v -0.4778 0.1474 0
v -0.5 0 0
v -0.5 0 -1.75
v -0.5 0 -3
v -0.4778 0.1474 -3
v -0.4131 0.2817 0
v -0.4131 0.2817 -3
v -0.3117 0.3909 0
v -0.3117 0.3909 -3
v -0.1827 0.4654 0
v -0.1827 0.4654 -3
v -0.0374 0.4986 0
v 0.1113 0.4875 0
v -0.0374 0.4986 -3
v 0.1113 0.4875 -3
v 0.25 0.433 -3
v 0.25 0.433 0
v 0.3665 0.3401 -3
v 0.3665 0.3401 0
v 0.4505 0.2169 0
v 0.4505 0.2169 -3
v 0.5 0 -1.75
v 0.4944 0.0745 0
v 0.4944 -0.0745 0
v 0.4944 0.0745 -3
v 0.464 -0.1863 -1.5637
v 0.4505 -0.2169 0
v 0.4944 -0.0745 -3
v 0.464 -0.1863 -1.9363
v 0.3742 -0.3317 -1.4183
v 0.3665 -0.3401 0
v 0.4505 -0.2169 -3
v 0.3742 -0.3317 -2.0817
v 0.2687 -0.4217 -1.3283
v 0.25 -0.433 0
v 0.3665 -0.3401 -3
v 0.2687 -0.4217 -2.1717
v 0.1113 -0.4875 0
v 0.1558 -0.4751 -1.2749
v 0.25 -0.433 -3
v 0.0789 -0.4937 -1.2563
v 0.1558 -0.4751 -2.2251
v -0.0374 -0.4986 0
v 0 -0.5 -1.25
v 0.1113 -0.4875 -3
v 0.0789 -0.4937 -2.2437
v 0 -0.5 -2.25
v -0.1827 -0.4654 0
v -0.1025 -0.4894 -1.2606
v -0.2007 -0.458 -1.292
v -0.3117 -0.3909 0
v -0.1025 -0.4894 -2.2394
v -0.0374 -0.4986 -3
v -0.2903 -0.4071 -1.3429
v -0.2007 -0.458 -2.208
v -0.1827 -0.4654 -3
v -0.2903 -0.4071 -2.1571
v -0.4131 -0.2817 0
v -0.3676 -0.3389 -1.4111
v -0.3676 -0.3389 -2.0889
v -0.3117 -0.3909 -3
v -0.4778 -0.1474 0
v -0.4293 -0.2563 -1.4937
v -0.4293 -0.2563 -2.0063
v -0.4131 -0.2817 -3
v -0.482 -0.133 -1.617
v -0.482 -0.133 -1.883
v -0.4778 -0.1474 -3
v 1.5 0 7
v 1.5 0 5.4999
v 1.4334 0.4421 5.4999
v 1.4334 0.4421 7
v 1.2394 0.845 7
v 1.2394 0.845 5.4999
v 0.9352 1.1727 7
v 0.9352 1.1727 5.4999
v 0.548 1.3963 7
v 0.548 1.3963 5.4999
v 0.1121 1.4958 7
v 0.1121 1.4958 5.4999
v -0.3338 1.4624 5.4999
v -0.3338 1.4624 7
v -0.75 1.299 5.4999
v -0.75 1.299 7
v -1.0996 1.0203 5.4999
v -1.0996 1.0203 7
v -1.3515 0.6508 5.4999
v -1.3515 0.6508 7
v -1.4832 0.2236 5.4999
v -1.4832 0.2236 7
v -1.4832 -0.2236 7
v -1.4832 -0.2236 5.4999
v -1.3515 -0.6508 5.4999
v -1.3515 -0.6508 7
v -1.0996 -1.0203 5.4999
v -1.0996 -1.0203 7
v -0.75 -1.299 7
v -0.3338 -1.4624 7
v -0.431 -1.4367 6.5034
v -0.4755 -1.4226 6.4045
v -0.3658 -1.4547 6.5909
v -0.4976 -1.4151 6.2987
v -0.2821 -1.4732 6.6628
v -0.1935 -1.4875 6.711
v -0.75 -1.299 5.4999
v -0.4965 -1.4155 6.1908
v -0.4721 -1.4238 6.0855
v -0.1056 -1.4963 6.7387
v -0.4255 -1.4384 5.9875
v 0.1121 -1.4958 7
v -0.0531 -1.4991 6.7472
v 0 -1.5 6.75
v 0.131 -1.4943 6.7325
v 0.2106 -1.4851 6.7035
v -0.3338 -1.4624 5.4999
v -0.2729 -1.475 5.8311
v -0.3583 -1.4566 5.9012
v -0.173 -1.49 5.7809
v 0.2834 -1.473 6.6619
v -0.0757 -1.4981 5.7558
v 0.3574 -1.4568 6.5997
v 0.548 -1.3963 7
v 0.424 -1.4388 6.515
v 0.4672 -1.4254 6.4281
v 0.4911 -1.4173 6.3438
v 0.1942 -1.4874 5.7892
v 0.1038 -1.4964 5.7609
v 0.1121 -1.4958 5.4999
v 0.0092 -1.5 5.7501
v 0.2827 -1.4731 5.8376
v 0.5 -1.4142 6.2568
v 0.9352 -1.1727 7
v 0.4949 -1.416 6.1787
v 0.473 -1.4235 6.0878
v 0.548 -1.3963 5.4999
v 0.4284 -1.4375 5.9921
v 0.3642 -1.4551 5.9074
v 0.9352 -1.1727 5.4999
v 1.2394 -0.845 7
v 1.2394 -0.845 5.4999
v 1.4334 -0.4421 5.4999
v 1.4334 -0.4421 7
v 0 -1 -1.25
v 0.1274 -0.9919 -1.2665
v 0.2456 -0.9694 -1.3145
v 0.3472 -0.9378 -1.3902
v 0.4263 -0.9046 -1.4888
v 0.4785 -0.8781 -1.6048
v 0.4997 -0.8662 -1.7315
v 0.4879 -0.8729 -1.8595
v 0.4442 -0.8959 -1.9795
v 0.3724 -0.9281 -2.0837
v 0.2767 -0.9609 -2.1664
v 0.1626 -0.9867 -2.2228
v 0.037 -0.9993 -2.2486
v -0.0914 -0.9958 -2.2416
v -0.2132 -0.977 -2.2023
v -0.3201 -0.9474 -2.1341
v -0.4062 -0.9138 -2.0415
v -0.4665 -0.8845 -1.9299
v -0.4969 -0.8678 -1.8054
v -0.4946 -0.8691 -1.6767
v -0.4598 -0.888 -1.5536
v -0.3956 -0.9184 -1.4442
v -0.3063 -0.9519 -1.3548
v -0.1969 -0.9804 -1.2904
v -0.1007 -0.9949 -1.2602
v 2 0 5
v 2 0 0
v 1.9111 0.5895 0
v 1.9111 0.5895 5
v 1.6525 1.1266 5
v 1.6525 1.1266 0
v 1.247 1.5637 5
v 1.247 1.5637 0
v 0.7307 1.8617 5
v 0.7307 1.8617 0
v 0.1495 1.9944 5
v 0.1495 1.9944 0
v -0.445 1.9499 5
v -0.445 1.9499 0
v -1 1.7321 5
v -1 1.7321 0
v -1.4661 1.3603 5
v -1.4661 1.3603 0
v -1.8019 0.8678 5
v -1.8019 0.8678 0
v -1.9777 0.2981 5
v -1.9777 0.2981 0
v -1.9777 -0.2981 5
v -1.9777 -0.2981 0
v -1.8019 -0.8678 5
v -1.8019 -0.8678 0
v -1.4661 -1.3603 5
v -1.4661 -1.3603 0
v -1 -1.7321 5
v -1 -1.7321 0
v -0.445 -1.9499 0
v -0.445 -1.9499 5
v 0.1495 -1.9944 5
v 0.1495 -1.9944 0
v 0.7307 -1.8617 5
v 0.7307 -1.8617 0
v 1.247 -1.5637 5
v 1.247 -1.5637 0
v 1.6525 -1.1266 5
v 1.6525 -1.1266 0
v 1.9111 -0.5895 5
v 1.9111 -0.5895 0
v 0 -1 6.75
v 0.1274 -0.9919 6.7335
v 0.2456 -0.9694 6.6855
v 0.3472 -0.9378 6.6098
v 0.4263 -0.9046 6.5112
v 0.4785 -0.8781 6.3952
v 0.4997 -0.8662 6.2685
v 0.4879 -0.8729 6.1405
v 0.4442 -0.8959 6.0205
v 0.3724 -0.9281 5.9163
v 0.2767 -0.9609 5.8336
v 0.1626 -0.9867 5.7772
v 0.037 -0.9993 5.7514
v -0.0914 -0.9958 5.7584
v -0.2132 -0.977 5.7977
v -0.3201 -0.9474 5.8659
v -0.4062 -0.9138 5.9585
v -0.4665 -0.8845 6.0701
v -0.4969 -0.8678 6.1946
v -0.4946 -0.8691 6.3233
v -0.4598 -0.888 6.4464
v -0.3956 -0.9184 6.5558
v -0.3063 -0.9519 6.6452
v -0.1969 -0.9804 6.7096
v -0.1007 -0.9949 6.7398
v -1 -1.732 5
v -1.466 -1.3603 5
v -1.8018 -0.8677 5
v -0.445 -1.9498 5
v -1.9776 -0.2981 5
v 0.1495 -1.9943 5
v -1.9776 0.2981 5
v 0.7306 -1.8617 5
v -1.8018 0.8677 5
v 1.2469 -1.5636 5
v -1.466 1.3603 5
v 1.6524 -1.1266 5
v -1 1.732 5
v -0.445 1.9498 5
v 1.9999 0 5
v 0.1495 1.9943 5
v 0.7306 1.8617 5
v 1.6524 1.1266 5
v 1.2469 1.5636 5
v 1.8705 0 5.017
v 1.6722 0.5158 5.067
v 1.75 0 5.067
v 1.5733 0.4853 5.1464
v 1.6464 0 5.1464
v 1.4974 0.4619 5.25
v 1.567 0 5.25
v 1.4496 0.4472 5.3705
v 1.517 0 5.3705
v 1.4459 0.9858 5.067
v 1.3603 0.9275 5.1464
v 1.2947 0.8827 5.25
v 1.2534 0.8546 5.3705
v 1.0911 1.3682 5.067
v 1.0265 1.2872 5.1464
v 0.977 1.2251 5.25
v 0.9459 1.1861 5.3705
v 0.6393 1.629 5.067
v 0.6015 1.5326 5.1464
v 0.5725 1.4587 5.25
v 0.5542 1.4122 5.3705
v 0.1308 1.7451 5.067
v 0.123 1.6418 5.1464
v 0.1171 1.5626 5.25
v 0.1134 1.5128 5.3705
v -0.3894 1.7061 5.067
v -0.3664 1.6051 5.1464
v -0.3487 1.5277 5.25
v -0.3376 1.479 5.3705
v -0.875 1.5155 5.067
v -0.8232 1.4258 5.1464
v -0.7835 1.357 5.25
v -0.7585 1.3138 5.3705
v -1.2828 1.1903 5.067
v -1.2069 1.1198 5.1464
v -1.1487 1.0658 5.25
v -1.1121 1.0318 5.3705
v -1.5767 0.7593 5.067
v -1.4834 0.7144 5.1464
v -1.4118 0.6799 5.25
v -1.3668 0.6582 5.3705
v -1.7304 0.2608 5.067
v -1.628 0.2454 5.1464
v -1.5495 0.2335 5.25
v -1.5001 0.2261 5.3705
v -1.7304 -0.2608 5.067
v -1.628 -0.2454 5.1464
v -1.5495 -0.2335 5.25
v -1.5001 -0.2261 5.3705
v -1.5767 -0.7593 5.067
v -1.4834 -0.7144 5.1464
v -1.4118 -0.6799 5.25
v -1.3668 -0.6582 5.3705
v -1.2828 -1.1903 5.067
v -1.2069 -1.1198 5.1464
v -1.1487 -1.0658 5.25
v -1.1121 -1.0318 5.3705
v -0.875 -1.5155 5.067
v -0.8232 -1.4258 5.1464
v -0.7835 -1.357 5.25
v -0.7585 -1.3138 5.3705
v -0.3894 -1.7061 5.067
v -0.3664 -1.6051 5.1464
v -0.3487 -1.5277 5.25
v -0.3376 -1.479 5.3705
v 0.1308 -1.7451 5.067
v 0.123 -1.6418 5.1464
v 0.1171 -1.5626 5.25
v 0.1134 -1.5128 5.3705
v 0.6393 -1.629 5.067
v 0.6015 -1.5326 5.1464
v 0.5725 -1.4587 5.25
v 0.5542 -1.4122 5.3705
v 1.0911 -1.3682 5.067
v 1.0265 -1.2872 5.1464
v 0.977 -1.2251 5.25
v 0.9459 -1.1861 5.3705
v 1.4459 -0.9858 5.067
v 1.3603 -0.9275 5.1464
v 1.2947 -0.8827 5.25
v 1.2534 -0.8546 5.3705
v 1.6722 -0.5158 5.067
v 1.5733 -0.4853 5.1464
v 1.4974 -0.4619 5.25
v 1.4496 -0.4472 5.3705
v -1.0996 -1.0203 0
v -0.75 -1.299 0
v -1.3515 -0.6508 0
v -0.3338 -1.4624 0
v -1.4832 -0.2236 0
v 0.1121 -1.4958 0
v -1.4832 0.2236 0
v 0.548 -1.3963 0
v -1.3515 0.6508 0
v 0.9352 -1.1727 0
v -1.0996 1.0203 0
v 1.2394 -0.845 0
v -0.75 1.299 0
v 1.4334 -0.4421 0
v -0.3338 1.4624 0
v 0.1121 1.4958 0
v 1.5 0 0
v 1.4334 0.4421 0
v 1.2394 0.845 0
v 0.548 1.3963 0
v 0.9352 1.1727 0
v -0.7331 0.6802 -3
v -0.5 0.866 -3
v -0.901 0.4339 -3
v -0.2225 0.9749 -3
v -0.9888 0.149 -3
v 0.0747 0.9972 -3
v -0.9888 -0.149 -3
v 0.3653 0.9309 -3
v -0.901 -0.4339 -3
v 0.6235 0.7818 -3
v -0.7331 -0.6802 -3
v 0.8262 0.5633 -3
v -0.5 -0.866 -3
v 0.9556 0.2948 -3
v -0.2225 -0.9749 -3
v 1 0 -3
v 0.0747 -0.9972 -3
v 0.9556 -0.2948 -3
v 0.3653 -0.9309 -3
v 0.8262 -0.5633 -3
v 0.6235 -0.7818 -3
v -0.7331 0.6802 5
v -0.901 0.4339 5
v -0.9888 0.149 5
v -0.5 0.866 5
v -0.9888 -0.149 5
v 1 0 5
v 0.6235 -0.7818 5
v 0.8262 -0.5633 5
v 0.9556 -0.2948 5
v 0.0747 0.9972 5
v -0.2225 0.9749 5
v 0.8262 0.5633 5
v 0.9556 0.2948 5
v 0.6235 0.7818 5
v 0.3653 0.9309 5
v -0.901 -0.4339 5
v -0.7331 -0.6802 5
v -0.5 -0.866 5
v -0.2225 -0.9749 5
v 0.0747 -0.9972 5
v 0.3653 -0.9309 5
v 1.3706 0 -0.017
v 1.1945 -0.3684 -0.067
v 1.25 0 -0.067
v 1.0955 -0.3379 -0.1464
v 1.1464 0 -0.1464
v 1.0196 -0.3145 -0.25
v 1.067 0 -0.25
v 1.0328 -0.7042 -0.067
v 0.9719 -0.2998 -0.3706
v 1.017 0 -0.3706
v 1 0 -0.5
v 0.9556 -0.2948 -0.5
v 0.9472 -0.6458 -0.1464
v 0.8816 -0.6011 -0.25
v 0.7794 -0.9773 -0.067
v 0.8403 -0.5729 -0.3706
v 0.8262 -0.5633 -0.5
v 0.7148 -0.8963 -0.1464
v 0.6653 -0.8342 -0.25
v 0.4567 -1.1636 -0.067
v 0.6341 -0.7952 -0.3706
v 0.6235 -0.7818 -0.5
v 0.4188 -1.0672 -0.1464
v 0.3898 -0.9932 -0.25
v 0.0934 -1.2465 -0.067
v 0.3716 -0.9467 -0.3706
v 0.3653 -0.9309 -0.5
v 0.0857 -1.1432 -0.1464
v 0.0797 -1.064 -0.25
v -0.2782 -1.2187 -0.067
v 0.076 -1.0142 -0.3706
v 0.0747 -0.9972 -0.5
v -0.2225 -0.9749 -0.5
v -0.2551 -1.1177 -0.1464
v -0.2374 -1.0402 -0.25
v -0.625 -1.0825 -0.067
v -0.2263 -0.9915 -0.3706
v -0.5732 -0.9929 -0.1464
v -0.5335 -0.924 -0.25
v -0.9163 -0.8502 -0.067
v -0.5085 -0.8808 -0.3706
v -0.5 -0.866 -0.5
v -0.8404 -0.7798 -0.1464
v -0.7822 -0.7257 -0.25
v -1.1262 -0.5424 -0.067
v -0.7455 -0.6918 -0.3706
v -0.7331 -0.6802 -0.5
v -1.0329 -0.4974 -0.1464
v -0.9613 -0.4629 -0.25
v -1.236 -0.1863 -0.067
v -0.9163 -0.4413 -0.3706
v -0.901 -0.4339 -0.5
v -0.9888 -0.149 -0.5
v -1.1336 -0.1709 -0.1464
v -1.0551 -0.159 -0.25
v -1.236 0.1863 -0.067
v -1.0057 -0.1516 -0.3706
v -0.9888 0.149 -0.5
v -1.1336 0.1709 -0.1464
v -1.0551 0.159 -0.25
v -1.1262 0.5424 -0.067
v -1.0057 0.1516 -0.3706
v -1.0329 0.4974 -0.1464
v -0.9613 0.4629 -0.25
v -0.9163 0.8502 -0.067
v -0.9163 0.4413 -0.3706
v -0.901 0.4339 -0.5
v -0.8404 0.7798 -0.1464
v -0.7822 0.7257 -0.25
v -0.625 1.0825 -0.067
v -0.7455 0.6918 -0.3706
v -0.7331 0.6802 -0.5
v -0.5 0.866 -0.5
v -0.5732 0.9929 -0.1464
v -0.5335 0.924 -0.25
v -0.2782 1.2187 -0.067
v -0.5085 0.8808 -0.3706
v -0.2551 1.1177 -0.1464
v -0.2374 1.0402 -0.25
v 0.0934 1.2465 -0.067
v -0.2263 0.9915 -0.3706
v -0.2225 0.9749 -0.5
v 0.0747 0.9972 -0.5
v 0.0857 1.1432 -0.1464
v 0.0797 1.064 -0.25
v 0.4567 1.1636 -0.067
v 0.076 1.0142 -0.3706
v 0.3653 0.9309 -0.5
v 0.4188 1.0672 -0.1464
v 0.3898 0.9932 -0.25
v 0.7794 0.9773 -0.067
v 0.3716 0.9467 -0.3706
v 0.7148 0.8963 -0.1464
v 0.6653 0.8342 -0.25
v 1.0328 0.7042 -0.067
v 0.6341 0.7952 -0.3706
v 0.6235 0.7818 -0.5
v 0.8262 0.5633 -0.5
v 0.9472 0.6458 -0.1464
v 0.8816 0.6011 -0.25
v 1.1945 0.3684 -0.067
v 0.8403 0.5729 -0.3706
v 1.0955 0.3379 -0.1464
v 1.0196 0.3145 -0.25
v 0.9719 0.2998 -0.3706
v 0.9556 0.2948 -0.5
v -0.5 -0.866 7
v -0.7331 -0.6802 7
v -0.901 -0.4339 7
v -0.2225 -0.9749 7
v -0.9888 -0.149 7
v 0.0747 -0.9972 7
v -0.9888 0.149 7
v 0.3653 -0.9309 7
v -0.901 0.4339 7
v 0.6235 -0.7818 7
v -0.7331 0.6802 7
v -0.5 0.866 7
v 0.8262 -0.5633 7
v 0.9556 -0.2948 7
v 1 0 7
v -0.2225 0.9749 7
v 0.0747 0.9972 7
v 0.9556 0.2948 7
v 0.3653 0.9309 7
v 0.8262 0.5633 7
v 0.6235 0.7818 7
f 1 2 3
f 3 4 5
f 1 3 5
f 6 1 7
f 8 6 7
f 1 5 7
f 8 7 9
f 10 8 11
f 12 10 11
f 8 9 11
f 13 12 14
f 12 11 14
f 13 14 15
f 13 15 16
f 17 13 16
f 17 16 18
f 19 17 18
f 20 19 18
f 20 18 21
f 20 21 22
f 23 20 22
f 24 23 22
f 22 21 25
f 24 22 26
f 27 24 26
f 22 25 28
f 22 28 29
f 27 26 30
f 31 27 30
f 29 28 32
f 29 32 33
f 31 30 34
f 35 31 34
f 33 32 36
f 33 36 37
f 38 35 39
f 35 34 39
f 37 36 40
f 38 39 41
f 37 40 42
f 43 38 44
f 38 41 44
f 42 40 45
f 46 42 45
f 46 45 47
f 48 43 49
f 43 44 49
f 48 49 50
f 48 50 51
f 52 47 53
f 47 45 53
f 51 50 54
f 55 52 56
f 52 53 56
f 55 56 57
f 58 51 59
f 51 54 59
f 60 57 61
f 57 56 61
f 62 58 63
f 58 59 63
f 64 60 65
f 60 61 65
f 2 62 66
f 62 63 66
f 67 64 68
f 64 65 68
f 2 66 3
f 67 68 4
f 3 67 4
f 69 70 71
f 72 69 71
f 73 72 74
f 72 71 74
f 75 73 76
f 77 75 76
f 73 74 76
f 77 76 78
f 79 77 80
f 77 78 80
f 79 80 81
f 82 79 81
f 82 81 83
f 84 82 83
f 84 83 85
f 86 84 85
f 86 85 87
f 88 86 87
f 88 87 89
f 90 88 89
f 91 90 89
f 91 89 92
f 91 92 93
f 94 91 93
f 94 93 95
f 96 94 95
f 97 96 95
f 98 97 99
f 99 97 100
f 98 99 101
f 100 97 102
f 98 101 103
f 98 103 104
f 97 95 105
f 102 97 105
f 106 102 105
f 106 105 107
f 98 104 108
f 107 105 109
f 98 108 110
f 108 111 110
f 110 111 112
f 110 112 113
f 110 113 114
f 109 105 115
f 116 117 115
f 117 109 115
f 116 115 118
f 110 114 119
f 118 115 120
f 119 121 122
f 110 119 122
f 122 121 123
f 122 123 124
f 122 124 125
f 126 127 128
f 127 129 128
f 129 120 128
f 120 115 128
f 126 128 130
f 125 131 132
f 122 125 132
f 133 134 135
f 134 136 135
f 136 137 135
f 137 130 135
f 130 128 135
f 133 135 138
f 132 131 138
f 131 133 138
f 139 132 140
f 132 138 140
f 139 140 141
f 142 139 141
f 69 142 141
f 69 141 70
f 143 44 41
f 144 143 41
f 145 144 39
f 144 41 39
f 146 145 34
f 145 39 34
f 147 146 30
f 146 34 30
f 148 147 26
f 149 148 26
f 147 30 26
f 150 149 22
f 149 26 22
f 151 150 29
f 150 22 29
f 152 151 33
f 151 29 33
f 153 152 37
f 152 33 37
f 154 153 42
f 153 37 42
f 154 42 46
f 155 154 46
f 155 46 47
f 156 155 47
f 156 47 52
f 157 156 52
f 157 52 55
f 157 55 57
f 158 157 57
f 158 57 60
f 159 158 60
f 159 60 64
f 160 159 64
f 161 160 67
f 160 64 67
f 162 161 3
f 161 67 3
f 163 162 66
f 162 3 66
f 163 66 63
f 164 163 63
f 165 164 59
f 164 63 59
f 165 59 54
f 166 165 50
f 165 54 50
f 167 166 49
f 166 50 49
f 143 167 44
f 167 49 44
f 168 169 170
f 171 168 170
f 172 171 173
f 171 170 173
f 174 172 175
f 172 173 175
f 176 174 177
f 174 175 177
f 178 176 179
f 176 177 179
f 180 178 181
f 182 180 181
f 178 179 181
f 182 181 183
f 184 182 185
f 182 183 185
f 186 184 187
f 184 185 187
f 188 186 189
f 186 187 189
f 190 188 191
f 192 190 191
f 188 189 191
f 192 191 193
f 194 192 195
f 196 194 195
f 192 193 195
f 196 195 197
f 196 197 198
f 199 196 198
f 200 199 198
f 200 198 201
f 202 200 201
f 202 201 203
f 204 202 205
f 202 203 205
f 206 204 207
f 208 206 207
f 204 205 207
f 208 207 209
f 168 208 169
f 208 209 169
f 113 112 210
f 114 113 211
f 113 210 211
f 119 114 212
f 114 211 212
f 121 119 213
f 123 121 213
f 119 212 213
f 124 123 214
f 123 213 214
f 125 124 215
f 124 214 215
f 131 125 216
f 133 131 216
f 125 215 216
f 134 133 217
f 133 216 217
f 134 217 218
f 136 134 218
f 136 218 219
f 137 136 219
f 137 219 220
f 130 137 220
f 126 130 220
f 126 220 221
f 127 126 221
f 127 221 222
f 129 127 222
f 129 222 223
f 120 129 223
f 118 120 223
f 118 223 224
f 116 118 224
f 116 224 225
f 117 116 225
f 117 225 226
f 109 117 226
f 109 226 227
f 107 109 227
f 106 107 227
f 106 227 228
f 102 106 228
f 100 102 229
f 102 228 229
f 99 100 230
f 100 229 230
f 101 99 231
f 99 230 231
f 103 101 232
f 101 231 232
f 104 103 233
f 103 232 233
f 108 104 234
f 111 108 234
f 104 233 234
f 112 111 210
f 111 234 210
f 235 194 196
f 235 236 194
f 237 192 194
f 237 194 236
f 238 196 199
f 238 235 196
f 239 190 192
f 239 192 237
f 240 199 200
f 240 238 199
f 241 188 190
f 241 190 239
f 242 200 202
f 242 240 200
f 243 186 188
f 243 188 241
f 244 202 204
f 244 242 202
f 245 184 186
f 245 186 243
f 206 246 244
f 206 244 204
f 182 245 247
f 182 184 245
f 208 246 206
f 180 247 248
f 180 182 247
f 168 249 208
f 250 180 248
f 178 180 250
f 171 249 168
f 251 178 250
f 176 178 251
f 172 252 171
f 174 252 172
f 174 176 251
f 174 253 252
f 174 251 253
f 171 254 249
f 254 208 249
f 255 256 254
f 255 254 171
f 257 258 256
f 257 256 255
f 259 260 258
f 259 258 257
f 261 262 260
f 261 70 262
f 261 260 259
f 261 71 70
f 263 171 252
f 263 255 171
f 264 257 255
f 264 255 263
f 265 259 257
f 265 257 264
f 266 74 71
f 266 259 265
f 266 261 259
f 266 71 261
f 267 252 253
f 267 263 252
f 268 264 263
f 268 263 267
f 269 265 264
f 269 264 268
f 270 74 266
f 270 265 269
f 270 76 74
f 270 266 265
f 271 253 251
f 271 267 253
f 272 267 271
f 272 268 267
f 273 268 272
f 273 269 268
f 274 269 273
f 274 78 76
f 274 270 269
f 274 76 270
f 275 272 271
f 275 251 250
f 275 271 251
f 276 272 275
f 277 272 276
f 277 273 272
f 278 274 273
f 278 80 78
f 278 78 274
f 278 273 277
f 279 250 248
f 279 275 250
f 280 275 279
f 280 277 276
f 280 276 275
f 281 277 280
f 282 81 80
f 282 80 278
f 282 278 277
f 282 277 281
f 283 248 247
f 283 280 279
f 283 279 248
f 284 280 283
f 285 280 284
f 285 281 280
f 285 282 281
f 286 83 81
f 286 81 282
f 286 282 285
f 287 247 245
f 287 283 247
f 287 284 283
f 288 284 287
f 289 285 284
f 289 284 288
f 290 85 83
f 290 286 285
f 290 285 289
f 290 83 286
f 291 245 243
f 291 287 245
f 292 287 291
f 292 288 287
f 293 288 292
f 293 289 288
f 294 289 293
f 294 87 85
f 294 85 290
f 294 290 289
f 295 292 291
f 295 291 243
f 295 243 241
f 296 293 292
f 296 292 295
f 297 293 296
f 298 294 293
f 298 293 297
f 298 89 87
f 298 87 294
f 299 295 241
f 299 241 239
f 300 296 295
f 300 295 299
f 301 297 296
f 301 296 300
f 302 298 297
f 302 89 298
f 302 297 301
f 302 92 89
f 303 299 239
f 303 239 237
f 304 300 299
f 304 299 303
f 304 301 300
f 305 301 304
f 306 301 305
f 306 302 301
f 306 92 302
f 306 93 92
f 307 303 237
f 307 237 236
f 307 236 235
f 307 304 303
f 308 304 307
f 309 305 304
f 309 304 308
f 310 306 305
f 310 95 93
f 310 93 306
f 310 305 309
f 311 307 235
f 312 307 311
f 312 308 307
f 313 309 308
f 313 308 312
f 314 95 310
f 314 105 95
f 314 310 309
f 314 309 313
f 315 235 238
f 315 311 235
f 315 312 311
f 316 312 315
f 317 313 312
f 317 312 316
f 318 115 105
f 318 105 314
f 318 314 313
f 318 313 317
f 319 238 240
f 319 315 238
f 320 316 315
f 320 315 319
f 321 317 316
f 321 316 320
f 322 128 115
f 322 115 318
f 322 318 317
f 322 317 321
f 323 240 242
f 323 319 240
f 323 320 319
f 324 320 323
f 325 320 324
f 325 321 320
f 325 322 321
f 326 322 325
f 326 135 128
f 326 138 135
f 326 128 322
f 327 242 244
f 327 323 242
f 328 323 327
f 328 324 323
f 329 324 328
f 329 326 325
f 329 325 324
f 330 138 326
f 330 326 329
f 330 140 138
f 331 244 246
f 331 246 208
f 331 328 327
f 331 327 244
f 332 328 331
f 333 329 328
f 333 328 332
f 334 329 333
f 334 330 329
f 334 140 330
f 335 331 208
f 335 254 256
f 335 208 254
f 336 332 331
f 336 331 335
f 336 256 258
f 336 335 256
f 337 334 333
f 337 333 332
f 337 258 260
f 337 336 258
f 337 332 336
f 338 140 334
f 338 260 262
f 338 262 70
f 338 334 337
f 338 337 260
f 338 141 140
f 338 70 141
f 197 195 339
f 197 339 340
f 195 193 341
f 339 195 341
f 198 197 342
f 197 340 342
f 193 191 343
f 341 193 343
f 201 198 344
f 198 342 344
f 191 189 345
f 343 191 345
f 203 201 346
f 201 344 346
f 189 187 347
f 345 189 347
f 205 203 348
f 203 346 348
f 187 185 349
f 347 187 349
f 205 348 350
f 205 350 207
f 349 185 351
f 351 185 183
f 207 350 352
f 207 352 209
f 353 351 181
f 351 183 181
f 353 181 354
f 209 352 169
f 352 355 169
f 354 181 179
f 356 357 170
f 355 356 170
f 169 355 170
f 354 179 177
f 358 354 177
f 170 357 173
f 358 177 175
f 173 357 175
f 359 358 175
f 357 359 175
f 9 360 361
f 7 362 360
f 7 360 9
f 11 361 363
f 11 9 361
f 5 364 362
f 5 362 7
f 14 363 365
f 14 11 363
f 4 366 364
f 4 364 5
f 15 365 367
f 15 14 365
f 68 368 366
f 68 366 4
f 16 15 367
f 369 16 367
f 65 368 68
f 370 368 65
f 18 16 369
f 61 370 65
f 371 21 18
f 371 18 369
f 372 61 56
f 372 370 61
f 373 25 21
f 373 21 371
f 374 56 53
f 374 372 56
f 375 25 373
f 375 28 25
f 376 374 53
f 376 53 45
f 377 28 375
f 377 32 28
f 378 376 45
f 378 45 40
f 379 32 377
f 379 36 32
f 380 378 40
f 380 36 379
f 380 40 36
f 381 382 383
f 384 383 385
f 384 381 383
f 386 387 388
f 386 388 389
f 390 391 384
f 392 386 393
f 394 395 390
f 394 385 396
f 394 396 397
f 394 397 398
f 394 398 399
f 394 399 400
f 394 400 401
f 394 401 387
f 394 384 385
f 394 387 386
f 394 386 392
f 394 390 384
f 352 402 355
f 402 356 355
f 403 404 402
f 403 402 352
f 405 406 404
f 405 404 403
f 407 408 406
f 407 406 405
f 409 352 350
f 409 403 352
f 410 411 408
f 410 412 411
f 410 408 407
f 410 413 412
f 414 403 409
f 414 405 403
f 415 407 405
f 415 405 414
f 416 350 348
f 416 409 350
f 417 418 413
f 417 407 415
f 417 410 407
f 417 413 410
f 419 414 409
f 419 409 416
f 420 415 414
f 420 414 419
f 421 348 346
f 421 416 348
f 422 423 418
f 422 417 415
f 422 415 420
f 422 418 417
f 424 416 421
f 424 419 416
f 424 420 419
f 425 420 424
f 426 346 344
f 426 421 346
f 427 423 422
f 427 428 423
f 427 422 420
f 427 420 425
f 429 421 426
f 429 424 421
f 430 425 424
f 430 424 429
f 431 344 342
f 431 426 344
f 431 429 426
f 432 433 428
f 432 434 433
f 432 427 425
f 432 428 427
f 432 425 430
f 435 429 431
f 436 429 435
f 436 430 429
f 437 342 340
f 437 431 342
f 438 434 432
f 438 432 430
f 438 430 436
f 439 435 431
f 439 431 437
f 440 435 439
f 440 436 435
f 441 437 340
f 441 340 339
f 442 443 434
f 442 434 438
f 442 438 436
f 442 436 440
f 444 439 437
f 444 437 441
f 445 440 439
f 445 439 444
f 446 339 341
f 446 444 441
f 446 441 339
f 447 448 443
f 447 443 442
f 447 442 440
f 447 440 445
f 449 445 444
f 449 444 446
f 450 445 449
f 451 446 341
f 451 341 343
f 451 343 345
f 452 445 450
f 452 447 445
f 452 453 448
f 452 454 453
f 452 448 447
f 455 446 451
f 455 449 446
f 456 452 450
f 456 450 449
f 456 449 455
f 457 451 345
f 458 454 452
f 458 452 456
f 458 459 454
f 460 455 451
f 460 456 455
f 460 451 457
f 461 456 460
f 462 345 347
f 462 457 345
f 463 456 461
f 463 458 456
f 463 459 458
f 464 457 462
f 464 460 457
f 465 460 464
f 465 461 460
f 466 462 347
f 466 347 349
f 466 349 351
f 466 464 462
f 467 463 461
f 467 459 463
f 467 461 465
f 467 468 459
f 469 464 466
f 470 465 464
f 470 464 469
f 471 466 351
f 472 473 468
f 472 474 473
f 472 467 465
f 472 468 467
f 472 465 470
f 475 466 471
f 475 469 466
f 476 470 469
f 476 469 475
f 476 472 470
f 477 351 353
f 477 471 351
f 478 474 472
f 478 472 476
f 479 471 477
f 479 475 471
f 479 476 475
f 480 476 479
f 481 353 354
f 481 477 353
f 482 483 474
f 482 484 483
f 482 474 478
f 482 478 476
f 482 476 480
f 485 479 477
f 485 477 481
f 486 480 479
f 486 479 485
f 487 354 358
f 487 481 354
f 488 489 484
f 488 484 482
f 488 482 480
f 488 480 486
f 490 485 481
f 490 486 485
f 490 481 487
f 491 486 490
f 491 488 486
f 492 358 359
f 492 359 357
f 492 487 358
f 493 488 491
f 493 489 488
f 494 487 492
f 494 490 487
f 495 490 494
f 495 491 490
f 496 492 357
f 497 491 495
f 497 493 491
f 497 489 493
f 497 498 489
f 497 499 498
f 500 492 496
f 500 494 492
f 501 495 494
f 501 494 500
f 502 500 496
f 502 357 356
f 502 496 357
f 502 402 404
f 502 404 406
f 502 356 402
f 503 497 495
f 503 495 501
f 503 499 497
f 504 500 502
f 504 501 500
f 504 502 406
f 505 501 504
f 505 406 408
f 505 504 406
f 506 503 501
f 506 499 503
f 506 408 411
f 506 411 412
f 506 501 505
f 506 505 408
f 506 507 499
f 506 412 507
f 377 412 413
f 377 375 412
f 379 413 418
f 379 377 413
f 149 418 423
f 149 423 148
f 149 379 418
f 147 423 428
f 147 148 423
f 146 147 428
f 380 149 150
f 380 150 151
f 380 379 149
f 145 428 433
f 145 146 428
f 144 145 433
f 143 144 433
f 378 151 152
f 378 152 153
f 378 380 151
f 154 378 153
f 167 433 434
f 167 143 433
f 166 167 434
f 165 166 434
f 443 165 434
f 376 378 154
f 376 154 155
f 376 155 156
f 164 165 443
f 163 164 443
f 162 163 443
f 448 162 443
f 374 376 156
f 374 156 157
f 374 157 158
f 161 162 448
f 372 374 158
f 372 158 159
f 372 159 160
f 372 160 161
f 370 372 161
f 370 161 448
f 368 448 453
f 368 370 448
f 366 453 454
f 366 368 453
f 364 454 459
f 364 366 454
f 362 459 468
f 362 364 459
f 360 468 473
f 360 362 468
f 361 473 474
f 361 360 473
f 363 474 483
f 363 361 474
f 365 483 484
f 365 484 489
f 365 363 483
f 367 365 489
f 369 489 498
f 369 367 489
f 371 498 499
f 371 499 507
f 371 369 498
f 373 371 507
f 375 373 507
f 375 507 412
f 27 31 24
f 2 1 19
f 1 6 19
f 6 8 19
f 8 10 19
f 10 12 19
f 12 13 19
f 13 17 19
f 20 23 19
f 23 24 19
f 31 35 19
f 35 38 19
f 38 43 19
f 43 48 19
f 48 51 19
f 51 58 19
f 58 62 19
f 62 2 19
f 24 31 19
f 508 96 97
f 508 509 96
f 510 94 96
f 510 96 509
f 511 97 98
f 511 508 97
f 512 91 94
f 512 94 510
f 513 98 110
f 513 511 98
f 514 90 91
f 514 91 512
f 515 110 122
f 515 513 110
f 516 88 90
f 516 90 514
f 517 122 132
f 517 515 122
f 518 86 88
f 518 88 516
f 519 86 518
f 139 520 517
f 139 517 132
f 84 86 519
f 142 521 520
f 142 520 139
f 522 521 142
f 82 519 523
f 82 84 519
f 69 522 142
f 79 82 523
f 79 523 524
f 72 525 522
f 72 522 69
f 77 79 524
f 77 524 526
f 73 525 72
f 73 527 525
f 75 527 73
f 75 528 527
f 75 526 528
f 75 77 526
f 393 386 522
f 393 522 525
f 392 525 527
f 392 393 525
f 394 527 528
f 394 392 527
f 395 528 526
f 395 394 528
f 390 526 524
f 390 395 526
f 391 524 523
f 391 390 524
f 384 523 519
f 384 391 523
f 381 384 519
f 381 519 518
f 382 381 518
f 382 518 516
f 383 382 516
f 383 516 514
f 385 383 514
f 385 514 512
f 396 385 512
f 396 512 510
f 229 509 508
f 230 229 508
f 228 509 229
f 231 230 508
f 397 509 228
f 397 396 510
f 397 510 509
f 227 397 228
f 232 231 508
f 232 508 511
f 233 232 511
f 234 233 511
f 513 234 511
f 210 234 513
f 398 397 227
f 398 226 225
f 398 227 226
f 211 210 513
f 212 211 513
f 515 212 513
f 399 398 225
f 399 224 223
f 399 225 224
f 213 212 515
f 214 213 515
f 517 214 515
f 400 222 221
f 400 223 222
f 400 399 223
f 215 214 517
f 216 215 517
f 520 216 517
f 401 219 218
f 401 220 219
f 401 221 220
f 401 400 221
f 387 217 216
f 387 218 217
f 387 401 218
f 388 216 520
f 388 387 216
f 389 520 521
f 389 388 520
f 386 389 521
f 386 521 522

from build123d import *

# Parameters (mm, degrees)
ESQUISSE1_R             = 2
BOSS_EXTRU_1_DEPTH      = 5
ESQUISSE2_R             = 1.5
ESQUISSE2_R_2           = 1
BOSS_EXTRU_2_DEPTH      = 2
BOSS_EXTRU_3_START      = 3
ESQUISSE3_R             = 1
ESQUISSE3_R_2           = 0.5
BOSS_EXTRU_3_DEPTH      = 3
CONG_1_R                = 0.5
CONG_2_R                = 0.5
ESQUISSE5_R             = 0.5
ENL_V_MAT_EXTRU_1_DEPTH = 2


with BuildPart() as part:
    # Esquisse1 → Boss.-Extru.1 (new body)
    with BuildSketch(Plane.XY):
        Circle(ESQUISSE1_R)
    extrude(amount=BOSS_EXTRU_1_DEPTH)

    # Esquisse2 → Boss.-Extru.2 (add)
    with BuildSketch(Plane.XY.offset(5)):
        Circle(ESQUISSE2_R)
        Circle(ESQUISSE2_R_2, mode=Mode.SUBTRACT)
    extrude(amount=BOSS_EXTRU_2_DEPTH)

    # Esquisse3 → Boss.-Extru.3 (add)
    with BuildSketch(Plane(origin=(0, 0, 0), x_dir=(-1, 0, 0), z_dir=(0, 0, -1)).offset(BOSS_EXTRU_3_START)):
        with Locations(Location((0, 0, 0), (0, 0, 180))):
            Circle(ESQUISSE3_R)
        Circle(ESQUISSE3_R_2, mode=Mode.SUBTRACT)
    extrude(amount=-BOSS_EXTRU_3_DEPTH)

    # Congé1
    cong_1_edges = [part.edges().sort_by_distance(p)[0] for p in [
        (-1, 0, 0),
    ]]
    fillet(cong_1_edges, radius=CONG_1_R)

    # Congé2
    cong_2_edges = [part.edges().sort_by_distance(p)[0] for p in [
        (-1.5, 0, 5),
    ]]
    fillet(cong_2_edges, radius=CONG_2_R - 0.0001)  # a hair under: the kernel refuses the full size

    # Esquisse5 → Enlèv. mat.-Extru.1 (cut)
    with BuildSketch(Plane(origin=(0, 0, 0), x_dir=(1, 0, 0), z_dir=(0, 1, 0))):
        with Locations(Location((0, 1.75, 0), (0, 0, 270))):
            Circle(ESQUISSE5_R)
        with Locations(Location((0, -6.25, 0), (0, 0, 270))):
            Circle(ESQUISSE5_R)
    extrude(amount=-ENL_V_MAT_EXTRU_1_DEPTH, mode=Mode.SUBTRACT)


solid = part.part
